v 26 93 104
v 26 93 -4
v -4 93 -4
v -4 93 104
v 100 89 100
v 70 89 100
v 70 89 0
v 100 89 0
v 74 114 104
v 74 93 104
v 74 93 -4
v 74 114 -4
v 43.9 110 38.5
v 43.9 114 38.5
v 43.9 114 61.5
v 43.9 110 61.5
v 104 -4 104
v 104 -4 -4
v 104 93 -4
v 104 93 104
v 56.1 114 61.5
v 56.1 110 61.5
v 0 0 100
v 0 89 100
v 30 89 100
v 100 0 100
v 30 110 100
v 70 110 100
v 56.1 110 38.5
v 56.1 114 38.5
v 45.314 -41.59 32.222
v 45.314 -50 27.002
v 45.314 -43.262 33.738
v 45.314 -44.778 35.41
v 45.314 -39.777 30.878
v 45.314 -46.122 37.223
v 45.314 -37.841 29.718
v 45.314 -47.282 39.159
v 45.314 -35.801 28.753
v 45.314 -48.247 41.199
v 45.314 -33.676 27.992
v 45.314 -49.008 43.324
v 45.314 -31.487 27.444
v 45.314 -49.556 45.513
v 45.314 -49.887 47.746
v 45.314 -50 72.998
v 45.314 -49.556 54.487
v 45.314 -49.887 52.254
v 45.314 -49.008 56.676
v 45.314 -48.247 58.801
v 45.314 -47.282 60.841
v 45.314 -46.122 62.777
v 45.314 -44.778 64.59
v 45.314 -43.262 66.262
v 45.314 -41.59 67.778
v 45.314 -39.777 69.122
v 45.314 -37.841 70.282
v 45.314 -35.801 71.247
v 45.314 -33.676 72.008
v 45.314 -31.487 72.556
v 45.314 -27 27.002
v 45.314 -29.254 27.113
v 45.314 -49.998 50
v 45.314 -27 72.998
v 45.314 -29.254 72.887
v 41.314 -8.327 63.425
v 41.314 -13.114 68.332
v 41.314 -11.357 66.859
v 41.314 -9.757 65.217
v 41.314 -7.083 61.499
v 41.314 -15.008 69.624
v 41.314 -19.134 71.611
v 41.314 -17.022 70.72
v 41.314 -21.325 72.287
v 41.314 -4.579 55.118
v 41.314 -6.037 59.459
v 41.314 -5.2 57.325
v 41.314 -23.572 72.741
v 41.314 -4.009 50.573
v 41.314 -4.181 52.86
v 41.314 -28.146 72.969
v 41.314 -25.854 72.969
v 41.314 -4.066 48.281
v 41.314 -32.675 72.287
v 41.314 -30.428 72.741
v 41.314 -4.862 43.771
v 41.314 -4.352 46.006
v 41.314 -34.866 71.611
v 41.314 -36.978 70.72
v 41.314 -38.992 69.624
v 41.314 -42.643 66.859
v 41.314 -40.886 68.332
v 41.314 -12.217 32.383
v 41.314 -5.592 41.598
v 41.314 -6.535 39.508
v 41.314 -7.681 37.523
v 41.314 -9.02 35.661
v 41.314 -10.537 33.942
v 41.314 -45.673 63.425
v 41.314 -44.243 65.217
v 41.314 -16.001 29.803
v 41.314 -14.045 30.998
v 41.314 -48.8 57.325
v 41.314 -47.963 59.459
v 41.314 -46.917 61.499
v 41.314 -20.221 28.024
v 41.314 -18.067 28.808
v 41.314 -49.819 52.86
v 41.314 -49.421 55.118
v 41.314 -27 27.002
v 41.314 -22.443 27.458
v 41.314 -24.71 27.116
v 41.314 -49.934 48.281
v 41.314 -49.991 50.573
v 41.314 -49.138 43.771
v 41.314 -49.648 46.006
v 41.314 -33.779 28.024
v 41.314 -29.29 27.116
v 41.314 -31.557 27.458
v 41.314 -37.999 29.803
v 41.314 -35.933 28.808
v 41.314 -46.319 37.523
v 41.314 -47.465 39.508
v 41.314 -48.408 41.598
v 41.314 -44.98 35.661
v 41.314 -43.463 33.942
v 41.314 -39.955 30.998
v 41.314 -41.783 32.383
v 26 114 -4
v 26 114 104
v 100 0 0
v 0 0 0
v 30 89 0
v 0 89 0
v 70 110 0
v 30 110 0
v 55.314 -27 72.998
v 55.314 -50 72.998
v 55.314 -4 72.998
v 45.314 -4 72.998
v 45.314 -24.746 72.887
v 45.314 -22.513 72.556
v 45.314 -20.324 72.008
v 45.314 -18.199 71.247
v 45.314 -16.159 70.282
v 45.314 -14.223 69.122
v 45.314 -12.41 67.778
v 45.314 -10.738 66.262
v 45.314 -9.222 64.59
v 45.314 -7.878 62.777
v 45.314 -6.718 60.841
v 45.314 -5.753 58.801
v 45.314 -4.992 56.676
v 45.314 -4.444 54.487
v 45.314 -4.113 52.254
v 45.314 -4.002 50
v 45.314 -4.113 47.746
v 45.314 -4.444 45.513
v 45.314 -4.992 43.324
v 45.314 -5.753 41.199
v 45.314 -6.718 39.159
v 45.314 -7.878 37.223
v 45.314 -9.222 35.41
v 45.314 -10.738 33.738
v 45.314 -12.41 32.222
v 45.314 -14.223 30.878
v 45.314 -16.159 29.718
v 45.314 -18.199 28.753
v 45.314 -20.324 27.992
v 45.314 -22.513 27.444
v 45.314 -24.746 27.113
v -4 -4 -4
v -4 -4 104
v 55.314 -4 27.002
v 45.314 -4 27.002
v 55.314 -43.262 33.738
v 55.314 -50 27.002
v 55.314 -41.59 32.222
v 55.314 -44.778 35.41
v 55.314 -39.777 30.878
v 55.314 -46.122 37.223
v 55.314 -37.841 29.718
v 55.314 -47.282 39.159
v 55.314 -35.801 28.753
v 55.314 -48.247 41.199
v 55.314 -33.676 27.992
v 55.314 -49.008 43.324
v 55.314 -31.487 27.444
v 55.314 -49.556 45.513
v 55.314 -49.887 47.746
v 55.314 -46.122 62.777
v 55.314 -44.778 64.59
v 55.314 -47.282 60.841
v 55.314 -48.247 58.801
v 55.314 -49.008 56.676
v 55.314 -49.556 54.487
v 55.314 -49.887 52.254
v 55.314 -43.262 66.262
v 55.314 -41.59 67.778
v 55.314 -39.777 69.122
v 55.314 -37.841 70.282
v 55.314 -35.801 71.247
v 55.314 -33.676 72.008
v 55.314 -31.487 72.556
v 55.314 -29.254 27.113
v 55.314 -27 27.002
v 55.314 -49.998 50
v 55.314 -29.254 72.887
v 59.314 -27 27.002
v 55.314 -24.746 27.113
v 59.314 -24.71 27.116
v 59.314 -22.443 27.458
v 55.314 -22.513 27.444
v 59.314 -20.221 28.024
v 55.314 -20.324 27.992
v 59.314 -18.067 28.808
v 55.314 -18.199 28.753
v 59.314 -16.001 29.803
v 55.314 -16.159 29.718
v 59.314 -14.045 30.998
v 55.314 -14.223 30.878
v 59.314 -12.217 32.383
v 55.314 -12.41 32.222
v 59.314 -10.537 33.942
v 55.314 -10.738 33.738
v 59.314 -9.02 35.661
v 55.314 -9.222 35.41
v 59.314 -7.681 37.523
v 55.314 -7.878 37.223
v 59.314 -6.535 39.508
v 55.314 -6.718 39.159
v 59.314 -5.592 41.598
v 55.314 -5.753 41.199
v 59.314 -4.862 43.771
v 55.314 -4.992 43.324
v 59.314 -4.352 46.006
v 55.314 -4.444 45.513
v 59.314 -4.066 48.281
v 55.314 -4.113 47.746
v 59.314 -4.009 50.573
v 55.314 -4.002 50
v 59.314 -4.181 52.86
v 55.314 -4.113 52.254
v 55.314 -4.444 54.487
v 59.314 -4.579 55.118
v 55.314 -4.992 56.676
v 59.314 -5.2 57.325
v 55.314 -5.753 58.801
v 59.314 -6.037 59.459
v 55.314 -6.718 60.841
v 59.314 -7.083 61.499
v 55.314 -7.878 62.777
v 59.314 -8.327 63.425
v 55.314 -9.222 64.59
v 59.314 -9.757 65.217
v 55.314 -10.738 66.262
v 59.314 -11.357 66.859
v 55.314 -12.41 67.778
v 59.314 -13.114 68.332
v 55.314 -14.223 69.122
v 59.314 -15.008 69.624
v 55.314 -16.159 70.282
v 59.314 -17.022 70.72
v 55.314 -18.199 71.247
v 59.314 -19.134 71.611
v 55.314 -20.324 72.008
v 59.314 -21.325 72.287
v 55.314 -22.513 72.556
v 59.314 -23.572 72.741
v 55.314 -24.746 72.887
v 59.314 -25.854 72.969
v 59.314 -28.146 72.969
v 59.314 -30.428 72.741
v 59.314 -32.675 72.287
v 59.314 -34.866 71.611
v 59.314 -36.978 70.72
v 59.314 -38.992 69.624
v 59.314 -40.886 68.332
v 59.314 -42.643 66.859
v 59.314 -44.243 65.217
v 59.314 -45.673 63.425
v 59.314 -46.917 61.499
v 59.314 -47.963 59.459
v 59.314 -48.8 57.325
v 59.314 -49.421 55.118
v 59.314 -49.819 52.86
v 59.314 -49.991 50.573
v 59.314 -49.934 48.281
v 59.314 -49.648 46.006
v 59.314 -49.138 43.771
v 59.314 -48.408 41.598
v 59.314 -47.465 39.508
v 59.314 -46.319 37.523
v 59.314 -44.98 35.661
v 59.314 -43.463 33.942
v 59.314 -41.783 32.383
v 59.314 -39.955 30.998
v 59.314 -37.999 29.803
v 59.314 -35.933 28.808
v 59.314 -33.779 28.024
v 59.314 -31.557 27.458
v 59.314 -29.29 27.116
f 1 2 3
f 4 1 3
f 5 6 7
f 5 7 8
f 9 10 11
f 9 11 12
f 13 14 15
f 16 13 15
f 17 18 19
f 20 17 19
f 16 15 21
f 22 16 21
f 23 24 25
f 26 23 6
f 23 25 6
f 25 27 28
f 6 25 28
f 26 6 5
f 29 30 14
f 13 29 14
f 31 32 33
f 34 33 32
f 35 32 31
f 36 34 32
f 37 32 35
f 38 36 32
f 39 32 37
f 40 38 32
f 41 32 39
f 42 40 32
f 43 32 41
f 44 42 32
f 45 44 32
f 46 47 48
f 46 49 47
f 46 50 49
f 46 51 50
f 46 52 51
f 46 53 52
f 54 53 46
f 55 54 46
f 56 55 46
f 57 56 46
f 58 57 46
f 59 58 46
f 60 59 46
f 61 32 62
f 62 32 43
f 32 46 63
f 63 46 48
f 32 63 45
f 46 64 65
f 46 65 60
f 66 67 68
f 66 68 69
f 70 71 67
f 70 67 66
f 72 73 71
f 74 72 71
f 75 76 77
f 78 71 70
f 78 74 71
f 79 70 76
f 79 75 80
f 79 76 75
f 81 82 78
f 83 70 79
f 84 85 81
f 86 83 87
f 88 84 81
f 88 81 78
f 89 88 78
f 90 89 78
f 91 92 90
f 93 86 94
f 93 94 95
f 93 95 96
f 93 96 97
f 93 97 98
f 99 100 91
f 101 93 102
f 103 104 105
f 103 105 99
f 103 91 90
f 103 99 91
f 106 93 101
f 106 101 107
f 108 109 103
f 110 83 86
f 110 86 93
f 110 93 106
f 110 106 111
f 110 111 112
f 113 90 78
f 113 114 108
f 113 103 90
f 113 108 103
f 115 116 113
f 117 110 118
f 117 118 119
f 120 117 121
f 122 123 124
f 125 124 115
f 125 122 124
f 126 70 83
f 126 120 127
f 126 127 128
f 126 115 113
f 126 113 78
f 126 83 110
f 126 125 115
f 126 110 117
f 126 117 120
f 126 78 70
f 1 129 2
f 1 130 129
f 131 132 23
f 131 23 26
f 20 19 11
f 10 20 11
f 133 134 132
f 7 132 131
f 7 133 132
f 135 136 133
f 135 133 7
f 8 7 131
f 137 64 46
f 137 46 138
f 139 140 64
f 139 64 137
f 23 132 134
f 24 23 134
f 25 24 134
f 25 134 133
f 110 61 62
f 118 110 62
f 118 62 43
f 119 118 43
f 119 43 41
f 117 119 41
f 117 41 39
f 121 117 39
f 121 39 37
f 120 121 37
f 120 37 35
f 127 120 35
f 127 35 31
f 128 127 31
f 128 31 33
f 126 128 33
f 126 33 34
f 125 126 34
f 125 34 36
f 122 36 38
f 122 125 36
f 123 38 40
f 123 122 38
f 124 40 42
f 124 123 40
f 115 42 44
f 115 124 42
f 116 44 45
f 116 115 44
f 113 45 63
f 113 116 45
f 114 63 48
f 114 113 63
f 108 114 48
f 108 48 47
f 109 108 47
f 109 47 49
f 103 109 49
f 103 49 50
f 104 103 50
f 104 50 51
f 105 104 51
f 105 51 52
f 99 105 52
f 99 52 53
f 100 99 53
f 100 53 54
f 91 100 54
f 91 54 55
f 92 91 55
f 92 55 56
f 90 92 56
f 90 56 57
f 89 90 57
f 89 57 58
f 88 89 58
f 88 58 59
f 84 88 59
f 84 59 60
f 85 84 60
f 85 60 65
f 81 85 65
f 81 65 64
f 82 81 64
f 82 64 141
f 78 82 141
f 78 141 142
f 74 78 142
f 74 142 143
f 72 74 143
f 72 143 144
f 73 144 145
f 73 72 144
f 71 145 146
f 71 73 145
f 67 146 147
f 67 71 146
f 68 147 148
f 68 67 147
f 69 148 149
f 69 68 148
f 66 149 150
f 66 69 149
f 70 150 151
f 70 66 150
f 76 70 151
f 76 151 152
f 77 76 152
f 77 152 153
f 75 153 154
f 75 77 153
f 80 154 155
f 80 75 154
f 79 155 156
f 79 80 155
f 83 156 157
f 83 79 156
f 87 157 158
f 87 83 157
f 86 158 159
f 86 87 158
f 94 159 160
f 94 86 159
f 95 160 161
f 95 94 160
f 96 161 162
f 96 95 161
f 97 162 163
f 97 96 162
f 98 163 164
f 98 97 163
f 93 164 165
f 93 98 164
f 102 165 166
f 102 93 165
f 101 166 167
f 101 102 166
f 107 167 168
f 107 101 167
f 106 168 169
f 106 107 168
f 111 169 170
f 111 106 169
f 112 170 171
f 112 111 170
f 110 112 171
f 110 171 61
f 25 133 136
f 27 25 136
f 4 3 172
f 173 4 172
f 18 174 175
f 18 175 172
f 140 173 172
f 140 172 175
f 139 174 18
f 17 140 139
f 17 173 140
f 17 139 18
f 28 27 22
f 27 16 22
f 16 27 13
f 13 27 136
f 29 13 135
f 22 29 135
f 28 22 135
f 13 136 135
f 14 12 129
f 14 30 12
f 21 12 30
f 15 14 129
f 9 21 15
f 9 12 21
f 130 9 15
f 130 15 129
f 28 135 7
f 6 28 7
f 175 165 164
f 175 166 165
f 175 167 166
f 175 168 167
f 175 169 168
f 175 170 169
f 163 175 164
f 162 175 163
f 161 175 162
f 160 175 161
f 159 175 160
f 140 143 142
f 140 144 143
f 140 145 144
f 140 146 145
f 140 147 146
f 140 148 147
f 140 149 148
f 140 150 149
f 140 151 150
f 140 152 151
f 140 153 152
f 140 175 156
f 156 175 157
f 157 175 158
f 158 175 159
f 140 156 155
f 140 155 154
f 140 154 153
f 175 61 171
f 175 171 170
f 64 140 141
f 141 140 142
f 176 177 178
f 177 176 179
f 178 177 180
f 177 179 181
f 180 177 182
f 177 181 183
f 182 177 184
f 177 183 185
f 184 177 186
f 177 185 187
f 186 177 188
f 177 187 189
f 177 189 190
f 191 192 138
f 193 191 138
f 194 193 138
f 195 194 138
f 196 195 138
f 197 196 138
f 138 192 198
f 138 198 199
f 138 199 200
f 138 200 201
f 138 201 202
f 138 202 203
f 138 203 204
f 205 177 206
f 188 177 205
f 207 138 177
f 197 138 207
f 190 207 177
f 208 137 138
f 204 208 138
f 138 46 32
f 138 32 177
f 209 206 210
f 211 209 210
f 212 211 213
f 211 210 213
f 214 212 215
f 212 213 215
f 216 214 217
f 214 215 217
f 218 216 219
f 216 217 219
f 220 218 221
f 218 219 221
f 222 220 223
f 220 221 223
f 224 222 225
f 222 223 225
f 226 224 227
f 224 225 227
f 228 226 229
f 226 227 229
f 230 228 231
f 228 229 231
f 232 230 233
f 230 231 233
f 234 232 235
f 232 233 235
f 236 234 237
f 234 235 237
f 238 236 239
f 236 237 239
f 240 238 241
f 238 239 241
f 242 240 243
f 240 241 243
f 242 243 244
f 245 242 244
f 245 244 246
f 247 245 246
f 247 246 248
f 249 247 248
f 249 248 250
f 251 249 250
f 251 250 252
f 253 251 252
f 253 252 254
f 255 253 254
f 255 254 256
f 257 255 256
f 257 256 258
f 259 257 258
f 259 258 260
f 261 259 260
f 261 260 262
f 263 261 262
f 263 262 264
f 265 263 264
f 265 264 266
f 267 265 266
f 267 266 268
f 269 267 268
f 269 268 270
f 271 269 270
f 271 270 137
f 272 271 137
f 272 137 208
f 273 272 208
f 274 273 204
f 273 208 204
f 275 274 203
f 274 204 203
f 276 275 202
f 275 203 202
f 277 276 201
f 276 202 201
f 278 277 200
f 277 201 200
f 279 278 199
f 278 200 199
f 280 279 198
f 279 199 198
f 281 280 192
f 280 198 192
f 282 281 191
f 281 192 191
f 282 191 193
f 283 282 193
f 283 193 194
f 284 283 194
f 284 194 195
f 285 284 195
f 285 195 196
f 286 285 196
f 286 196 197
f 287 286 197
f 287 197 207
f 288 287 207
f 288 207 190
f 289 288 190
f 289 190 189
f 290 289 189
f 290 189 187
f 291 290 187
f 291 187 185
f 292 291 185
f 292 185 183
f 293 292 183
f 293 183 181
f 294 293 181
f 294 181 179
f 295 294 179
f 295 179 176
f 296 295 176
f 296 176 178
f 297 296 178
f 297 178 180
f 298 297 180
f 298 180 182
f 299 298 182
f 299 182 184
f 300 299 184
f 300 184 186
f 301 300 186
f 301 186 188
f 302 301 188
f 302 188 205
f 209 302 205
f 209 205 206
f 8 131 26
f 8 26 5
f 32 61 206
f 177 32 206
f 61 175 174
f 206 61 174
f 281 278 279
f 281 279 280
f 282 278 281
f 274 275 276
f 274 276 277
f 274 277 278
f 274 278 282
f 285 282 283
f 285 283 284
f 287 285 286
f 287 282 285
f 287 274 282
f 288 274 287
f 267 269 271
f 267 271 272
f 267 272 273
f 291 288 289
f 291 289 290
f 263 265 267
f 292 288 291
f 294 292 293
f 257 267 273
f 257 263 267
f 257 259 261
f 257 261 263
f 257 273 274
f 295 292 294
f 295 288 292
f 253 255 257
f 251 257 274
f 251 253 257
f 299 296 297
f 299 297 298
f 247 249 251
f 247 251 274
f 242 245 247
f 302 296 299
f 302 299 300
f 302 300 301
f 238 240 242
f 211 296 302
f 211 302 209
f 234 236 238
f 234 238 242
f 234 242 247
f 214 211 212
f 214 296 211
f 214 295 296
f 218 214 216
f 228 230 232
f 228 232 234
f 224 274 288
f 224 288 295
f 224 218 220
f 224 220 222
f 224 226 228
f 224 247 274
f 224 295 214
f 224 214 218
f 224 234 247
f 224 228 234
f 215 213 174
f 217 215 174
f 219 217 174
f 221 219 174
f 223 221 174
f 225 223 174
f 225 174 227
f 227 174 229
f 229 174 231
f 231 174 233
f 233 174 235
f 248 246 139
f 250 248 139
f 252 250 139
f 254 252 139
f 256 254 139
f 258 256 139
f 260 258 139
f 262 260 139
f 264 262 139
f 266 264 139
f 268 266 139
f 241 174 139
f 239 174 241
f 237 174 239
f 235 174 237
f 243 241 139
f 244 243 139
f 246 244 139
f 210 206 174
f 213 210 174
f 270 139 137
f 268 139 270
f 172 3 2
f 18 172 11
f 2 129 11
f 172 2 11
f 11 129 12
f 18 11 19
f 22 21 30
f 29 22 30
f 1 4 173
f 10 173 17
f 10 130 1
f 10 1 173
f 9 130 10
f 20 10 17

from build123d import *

# Parameters (mm, degrees)
SKETCH_1_W          = 100
SKETCH_1_H          = 110
EXTRUDE_1_DEPTH     = 100
SKETCH_2_W          = 30
SKETCH_2_H          = 21
CUT_EXTRUDE_1_DEPTH = 100
EXTRUDE_START       = -100
EXTRUDE_3_DEPTH     = 100
EXTRUDE_2_DEPTH     = 4
EXTRUDE_3_2_DEPTH   = 4
SKETCH_4_W          = 6.1
SKETCH_4_H          = 11.5
CUT_EXTRUDE_4_DEPTH = 4
SKETCH_6_W          = 10
SKETCH_6_H          = 45.995714962
EXTRUDE_4_DEPTH     = 46
SKETCH_7_R          = 22.997857481
EXTRUDE_5_DEPTH     = 4
EXTRUDE_START_2     = 4
SKETCH_8_R          = 22.997857481
EXTRUDE_6_DEPTH     = 4


# Read off the part's stored shape, not the designer's step: 拉伸-薄壁3
with BuildPart() as part:
    # 草图1 → 凸台-拉伸1 (new body)
    with BuildSketch(Plane.XY):
        Polygon((-4, 0), (-4, 114), (104, 114), (104, -4), (-4, -4), align=None)
        with Locations((50, 55)):
            Rectangle(SKETCH_1_W, SKETCH_1_H, mode=Mode.SUBTRACT)
    extrude(amount=EXTRUDE_1_DEPTH)

    # 草图2 → 切除-拉伸1 (cut)
    with BuildSketch(Plane.XY.offset(100)):
        with Locations((11, 103.5)):
            Rectangle(SKETCH_2_W, SKETCH_2_H)
    cut_extrude_1 = extrude(amount=-CUT_EXTRUDE_1_DEPTH, mode=Mode.SUBTRACT)

    # Extrude 3 outline → Extrude 3 (add)
    with BuildSketch(Plane.XY.offset(100).offset(EXTRUDE_START)):
        Polygon((74, 110), (70, 110), (70, 89), (100, 89), (100, 93), (74, 93), align=None)
        Polygon((26, 93), (0, 93), (0, 89), (30, 89), (30, 110), (26, 110), align=None)
    extrude(amount=EXTRUDE_3_DEPTH)

    # 镜向1: 切除-拉伸1 across plane
    add(cut_extrude_1.mirror(Plane(origin=(50, 0, 0), x_dir=(0, 0, 1), z_dir=(1, 0, 0))), mode=Mode.SUBTRACT)

    # 草图3<3> → 凸台-拉伸2 (add)
    with BuildSketch(Plane.XY.offset(100)):
        Polygon((26, 93), (-4, 93), (-4, -4), (104, -4), (104, 93), (74, 93), (74, 114), (26, 114), align=None)
    extrude(amount=EXTRUDE_2_DEPTH)

    # 草图3<4> → Extrude 3 2 (add)
    with BuildSketch(Plane.XY.offset(100).offset(EXTRUDE_START)):
        Polygon((26, 93), (-4, 93), (-4, -4), (104, -4), (104, 93), (74, 93), (74, 114), (26, 114), align=None)
    extrude(amount=-EXTRUDE_3_2_DEPTH)

    # 草图4 → 切除-拉伸4 (cut)
    with BuildSketch(Plane(origin=(0, 114, 0), x_dir=(1, 0, 0), z_dir=(0, 1, 0))):
        with Locations((46.95, -44.25)):
            Rectangle(SKETCH_4_W, SKETCH_4_H)
        with Locations((53.05, -44.25)):
            Rectangle(SKETCH_4_W, SKETCH_4_H)
        with Locations((46.95, -55.75)):
            Rectangle(SKETCH_4_W, SKETCH_4_H)
        with Locations((53.05, -55.75)):
            Rectangle(SKETCH_4_W, SKETCH_4_H)
    extrude(amount=-CUT_EXTRUDE_4_DEPTH, mode=Mode.SUBTRACT)

    # 草图6 → 凸台-拉伸4 (add)
    with BuildSketch(Plane.XZ.offset(4)):
        with Locations((50.313928752, 50)):
            Rectangle(SKETCH_6_W, SKETCH_6_H)
    extrude(amount=EXTRUDE_4_DEPTH)

    # 草图7 → 凸台-拉伸5 (add)
    with BuildSketch(Plane(origin=(55.313928752, 0, 0), x_dir=(0, 0, -1), z_dir=(1, 0, 0))):
        with Locations((-50, -27)):
            Circle(SKETCH_7_R)
    extrude(amount=EXTRUDE_5_DEPTH)

    # 草图8 → 凸台-拉伸6 (add)
    with BuildSketch(Plane.ZY.offset(-45.313928752).offset(EXTRUDE_START_2)):
        with Locations(Location((50, -27, 0), (0, 0, 180))):
            Circle(SKETCH_8_R)
    extrude(amount=-EXTRUDE_6_DEPTH)


solid = part.part
